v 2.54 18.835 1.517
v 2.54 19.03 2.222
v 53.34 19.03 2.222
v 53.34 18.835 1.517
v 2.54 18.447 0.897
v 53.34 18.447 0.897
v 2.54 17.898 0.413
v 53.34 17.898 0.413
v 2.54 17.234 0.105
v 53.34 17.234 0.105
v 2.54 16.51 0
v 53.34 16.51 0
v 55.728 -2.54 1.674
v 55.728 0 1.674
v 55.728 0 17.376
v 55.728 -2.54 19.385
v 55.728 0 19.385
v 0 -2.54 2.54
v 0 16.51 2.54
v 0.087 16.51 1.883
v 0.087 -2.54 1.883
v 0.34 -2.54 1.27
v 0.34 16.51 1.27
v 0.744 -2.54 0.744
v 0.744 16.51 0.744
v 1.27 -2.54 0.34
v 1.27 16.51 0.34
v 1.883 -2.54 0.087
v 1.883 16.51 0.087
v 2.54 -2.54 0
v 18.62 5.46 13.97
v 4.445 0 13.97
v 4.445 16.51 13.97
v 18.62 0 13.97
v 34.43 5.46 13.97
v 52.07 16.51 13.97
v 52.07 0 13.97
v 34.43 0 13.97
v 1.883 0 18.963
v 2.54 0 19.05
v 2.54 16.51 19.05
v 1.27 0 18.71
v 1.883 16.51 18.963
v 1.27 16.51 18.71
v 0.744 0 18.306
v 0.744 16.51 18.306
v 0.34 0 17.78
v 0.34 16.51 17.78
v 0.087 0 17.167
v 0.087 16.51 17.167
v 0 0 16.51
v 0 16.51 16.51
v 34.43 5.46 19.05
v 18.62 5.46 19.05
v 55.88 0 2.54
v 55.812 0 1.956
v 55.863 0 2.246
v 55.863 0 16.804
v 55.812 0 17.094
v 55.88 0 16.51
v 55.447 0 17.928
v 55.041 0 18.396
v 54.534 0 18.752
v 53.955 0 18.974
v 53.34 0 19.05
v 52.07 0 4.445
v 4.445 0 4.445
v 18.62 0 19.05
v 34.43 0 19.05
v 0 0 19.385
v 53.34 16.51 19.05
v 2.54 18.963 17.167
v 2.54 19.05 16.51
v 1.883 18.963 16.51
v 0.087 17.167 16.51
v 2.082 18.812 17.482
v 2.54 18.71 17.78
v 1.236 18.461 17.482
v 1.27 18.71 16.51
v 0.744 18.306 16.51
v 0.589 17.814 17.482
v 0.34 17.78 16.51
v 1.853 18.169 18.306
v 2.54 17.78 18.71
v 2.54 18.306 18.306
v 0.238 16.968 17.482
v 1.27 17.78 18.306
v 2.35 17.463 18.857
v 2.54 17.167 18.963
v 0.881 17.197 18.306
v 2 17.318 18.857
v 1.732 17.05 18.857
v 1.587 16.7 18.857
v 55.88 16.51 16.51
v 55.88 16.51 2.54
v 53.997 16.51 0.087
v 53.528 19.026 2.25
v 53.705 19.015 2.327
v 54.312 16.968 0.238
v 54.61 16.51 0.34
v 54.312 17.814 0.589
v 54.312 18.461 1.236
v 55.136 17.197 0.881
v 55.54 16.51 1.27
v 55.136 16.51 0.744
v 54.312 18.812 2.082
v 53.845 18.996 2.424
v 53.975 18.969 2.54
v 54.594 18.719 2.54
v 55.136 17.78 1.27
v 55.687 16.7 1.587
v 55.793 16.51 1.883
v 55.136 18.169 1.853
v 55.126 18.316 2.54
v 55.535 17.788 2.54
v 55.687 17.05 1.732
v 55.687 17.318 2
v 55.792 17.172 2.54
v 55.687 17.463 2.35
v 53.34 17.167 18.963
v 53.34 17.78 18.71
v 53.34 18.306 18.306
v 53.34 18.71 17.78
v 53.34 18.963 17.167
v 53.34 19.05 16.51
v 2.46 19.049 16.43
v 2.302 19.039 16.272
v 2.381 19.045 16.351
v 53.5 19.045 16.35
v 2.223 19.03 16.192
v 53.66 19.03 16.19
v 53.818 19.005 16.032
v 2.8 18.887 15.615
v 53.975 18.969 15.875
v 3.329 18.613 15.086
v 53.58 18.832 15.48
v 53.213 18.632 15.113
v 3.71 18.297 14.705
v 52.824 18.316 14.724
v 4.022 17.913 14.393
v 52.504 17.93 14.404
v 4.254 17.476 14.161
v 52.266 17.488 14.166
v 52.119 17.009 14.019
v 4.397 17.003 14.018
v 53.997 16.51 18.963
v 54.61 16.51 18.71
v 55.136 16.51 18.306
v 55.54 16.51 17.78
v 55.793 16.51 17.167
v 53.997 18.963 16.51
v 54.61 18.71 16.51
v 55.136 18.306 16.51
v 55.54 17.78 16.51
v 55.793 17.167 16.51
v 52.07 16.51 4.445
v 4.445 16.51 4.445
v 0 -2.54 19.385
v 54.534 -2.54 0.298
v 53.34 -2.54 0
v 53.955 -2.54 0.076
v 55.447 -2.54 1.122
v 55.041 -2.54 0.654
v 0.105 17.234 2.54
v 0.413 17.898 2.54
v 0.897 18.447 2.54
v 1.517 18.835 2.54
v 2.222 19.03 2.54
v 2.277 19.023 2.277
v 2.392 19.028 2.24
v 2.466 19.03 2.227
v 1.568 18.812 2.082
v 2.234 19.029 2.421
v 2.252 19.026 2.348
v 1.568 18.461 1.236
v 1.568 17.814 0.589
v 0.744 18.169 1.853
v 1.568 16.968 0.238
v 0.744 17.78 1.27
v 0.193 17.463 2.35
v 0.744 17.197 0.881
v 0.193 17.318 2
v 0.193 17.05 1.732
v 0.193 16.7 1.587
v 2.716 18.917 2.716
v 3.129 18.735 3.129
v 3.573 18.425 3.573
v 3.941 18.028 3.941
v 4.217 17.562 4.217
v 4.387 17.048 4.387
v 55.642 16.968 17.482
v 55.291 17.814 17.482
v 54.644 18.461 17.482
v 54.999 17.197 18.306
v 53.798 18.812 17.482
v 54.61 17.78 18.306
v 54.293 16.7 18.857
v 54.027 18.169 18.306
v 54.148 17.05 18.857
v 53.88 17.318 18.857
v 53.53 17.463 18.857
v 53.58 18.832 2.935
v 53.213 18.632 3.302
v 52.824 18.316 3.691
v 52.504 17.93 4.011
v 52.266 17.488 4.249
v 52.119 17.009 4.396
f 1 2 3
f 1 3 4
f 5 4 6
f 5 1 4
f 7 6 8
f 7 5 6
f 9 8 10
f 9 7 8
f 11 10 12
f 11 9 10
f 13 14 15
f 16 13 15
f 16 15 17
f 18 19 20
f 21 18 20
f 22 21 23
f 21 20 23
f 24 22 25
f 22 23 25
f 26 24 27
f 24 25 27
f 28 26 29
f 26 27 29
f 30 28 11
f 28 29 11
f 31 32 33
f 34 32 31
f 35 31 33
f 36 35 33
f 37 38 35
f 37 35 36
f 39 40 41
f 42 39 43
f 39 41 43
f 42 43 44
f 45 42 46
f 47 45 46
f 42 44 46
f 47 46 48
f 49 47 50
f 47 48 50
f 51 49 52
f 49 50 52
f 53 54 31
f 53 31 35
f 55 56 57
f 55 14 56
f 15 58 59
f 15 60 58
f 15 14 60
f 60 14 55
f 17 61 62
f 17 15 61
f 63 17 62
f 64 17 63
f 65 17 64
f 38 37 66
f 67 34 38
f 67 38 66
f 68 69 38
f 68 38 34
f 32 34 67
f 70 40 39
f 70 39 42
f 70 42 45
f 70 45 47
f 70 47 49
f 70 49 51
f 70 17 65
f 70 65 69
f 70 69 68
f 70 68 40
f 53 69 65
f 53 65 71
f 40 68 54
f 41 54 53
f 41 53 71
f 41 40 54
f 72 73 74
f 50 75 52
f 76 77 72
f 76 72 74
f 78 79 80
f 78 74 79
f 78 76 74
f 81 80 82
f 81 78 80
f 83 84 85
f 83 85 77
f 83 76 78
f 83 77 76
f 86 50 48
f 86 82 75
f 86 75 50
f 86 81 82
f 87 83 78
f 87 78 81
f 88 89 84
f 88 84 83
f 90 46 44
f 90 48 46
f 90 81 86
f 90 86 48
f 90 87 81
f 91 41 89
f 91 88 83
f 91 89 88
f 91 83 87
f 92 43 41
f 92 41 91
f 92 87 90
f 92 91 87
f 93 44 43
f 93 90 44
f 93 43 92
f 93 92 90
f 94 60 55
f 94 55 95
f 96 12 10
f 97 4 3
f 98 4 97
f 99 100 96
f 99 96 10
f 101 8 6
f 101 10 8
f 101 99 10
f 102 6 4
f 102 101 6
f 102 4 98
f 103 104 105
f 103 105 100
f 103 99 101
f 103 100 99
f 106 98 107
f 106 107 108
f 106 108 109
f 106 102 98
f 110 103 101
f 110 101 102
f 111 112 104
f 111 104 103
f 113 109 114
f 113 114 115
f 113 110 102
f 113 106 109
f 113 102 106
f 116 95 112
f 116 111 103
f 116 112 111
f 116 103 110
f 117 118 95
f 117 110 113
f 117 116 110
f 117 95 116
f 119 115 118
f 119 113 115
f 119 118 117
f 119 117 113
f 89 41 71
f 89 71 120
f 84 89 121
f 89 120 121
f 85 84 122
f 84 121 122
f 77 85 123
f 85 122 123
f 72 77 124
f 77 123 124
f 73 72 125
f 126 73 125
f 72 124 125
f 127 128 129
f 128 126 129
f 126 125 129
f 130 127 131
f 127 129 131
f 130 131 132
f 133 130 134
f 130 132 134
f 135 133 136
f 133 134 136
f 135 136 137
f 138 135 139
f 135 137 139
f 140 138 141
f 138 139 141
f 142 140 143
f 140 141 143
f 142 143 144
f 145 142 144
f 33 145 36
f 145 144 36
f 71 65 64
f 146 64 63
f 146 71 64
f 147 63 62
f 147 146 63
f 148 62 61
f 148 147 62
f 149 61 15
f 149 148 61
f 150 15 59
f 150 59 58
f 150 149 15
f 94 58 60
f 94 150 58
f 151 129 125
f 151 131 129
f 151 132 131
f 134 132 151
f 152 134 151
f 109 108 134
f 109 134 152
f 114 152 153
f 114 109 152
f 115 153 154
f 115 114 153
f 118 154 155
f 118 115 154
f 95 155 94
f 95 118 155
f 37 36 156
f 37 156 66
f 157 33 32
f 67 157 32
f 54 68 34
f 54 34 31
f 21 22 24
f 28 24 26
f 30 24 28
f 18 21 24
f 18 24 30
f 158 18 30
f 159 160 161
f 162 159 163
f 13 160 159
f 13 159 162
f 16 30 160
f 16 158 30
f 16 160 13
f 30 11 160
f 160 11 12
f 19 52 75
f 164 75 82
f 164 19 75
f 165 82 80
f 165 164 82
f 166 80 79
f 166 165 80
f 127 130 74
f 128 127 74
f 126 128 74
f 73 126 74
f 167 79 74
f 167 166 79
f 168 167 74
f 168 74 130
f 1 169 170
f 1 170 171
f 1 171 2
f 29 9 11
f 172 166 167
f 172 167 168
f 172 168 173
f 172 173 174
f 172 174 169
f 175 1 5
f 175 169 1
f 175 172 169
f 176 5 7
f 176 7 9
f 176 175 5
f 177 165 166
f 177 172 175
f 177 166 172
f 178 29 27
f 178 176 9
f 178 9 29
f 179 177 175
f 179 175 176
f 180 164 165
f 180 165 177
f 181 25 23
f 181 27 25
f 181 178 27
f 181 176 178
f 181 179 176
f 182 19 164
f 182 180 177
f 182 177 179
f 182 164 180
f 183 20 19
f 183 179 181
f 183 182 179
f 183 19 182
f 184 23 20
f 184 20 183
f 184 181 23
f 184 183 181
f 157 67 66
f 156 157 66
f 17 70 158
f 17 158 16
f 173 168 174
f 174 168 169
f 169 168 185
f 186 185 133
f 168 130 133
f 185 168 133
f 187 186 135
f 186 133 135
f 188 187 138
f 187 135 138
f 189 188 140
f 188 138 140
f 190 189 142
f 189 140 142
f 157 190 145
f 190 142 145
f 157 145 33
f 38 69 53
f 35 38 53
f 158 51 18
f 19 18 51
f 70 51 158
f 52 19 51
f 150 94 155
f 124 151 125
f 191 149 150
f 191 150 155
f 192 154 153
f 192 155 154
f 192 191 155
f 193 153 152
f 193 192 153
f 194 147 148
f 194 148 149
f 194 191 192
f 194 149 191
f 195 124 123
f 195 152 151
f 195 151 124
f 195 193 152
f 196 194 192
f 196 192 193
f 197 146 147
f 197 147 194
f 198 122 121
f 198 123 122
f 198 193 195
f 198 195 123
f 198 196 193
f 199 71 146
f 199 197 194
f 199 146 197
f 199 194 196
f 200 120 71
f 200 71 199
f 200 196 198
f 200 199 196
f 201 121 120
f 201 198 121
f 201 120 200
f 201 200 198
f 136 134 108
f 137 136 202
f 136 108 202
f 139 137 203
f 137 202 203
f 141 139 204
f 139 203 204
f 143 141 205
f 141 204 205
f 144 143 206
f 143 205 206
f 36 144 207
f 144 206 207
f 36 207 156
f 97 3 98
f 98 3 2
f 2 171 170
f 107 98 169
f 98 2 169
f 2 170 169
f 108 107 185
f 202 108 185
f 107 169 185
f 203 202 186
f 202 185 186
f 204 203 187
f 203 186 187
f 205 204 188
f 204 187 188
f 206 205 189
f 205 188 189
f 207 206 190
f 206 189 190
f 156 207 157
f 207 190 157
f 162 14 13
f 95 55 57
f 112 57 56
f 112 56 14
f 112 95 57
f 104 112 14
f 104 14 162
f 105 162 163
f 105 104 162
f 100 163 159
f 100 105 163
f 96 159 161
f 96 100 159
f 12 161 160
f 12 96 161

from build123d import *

# Parameters (mm, degrees)
F0_W         = 19.05
F0_H         = 19.05
F1_DEPTH     = 55.88
F2_W         = 47.625
F2_H         = 9.525
F3_DEPTH     = 25.4
F4_W         = 55.7279027998
F4_H         = 19.3847697228
F5_DEPTH     = 2.54
F6_T1_DEPTH  = 50.8
F6_T3_DEPTH  = 13.97
F6_T5_DEPTH  = 47.625
F6_T7_DEPTH  = 9.525
F6_T9_DEPTH  = 16.51
F6_T11_DEPTH = 25.4
F6_T13_DEPTH = 22.86
F6_S17_W     = 2.5908
F6_S17_H     = 2.5908
F6_T18_DEPTH = 2.5908
F6_S23_W     = 2.5908
F6_S23_H     = 2.5908
F6_T24_DEPTH = 2.5908
F6_S29_W     = 2.5908
F6_S29_H     = 2.5908
F6_T30_DEPTH = 2.5908
F6_S35_W     = 2.5908
F6_S35_H     = 2.5908
F6_T36_DEPTH = 2.5908
F6_T43_DEPTH = 53.975
F6_T48_DEPTH = 15.875
F6_T56_DEPTH = 53.975
F6_T61_DEPTH = 15.875
F6_T69_DEPTH = 15.875
F6_T74_DEPTH = 53.975
F6_T82_DEPTH = 53.975
F6_T87_DEPTH = 15.875
F7_W         = 15.8100910485
F7_H         = 5.4600955918
F8_DEPTH     = 12.7


# Not quite as in the source:
# - a fillet or chamfer that OpenCascade refuses, or shapes differently, is made with other operations: its cross-section is extruded or revolved along the edge and cut away or added


with BuildPart() as f1:
    # F0 (on Right) → F1 (new body)
    with BuildSketch(Plane.YZ):
        with Locations((9.525, 9.525)):
            Rectangle(F0_W, F0_H)
    extrude(amount=F1_DEPTH)

    # F2 (on face) → F3 (cut)
    with BuildSketch(Plane.XZ):
        with Locations((28.2575, 9.2075)):
            Rectangle(F2_W, F2_H)
    extrude(amount=-F3_DEPTH, mode=Mode.SUBTRACT)

    # F4 (on Front) → F5 (join)
    with BuildSketch(Plane.XZ):
        with Locations((27.8639513999, 9.6923848614)):
            Rectangle(F4_W, F4_H)
    extrude(amount=F5_DEPTH)

    # F6: fillet of radius 2.54 on 12 edges, made by hand

    # F6_s2 → F6_t1 (cut)
    with BuildSketch(Plane.YZ.offset(2.54)):
        with BuildLine():
            ThreePointArc((19.05, 2.54), (18.3060512242, 0.7439487758), (16.51, 0))
            Line((16.51, 0), (19.05, 0))
            Line((19.05, 0), (19.05, 2.54))
        make_face()
        with BuildLine():
            ThreePointArc((16.51, 19.05), (18.3060512242, 18.3060512242), (19.05, 16.51))
            Line((19.05, 16.51), (19.05, 19.05))
            Line((19.05, 19.05), (16.51, 19.05))
        make_face()
    extrude(amount=F6_T1_DEPTH, mode=Mode.SUBTRACT)

    # F6_s4 → F6_t3 (cut)
    with BuildSketch(Plane.XY.offset(2.54)):
        with BuildLine():
            ThreePointArc((0, 16.51), (0.7439487758, 18.3060512242), (2.54, 19.05))
            Line((2.54, 19.05), (0, 19.05))
            Line((0, 19.05), (0, 16.51))
        make_face()
        with BuildLine():
            ThreePointArc((53.34, 19.05), (55.1360512242, 18.3060512242), (55.88, 16.51))
            Line((55.88, 16.51), (55.88, 19.05))
            Line((55.88, 19.05), (53.34, 19.05))
        make_face()
    extrude(amount=F6_T3_DEPTH, mode=Mode.SUBTRACT)

    # F6_s6 → F6_t5 (cut)
    with BuildSketch(Plane.YZ.offset(4.445)):
        with BuildLine():
            ThreePointArc((19.05, 16.51), (18.3060512242, 14.7139487758), (16.51, 13.97))
            Line((16.51, 13.97), (19.05, 13.97))
            Line((19.05, 13.97), (19.05, 16.51))
        make_face()
        with BuildLine():
            ThreePointArc((19.05, 1.905), (18.3060512242, 3.7010512242), (16.51, 4.445))
            Line((16.51, 4.445), (19.05, 4.445))
            Line((19.05, 4.445), (19.05, 1.905))
        make_face()
    extrude(amount=F6_T5_DEPTH, mode=Mode.SUBTRACT)

    # F6_s8 → F6_t7 (cut)
    with BuildSketch(Plane.XY.offset(4.445)):
        with BuildLine():
            ThreePointArc((1.905, 19.05), (3.7010512242, 18.3060512242), (4.445, 16.51))
            Line((4.445, 16.51), (4.445, 19.05))
            Line((4.445, 19.05), (1.905, 19.05))
        make_face()
        with BuildLine():
            ThreePointArc((54.61, 19.05), (52.8139487758, 18.3060512242), (52.07, 16.51))
            Line((52.07, 16.51), (52.07, 19.05))
            Line((52.07, 19.05), (54.61, 19.05))
        make_face()
    extrude(amount=F6_T7_DEPTH, mode=Mode.SUBTRACT)

    # F6_s10 → F6_t9 (cut)
    with BuildSketch(Plane.XZ.offset(-16.51)):
        with BuildLine():
            ThreePointArc((2.54, 19.05), (0.7439487758, 18.3060512242), (0, 16.51))
            Line((0, 16.51), (0, 19.05))
            Line((0, 19.05), (2.54, 19.05))
        make_face()
        with BuildLine():
            ThreePointArc((53.34, 19.05), (55.1360512242, 18.3060512242), (55.88, 16.51))
            Line((55.88, 16.51), (55.88, 19.05))
            Line((55.88, 19.05), (53.34, 19.05))
        make_face()
    extrude(amount=F6_T9_DEPTH, mode=Mode.SUBTRACT)

    # F6_s12 → F6_t11 (cut)
    with BuildSketch(Plane.XZ.offset(-16.51)):
        with BuildLine():
            ThreePointArc((0, 2.54), (0.7439487758, 0.7439487758), (2.54, 0))
            Line((2.54, 0), (0, 0))
            Line((0, 0), (0, 2.54))
        make_face()
    extrude(amount=F6_T11_DEPTH, mode=Mode.SUBTRACT)

    # F6_s14 → F6_t13 (cut)
    with BuildSketch(Plane.XZ.offset(-16.51)):
        with BuildLine():
            ThreePointArc((55.88, 2.54), (55.1360512242, 0.7439487758), (53.34, 0))
            Line((53.34, 0), (55.88, 0))
            Line((55.88, 0), (55.88, 2.54))
        make_face()
    extrude(amount=F6_T13_DEPTH, mode=Mode.SUBTRACT)


with BuildPart() as f6_tool16:
    # F6_s17 → F6_t18 (new body)
    with BuildSketch(Plane.YZ.offset(2.54)):
        with Locations((17.8054, 1.2446)):
            Rectangle(F6_S17_W, F6_S17_H)
    extrude(amount=-F6_T18_DEPTH)

    # F6_s19 → F6_t20 (revolve, cut)
    with BuildSketch(Plane(origin=(2.54, 16.51, 2.54), x_dir=(0, -0.7071067812, 0.7071067812), z_dir=(0, -0.7071067812, -0.7071067812))):
        with BuildLine():
            ThreePointArc((0, -2.54), (2.54, 0), (0, 2.54))
            Line((0, 2.54), (0, -2.54))
        make_face()
    revolve(axis=Axis((2.54, 16.51, 2.54), (-1, 0, 0)), mode=Mode.SUBTRACT)


with BuildPart() as f1_1:
    add(f1.part)

    # F6_t15: cut F6_tool16
    add(f6_tool16.part, mode=Mode.SUBTRACT)


with BuildPart() as f6_tool22:
    # F6_s23 → F6_t24 (new body)
    with BuildSketch(Plane.YZ.offset(53.34)):
        with Locations((17.8054, 1.2446)):
            Rectangle(F6_S23_W, F6_S23_H)
    extrude(amount=F6_T24_DEPTH)

    # F6_s25 → F6_t26 (revolve, cut)
    with BuildSketch(Plane(origin=(53.34, 16.51, 2.54), x_dir=(0, -0.7071067812, 0.7071067812), z_dir=(0, 0.7071067812, 0.7071067812))):
        with BuildLine():
            ThreePointArc((0, -2.54), (2.54, 0), (0, 2.54))
            Line((0, 2.54), (0, -2.54))
        make_face()
    revolve(axis=Axis((53.34, 16.51, 2.54), (1, 0, 0)), mode=Mode.SUBTRACT)


with BuildPart() as f1_2:
    add(f1_1.part)

    # F6_t21: cut F6_tool22
    add(f6_tool22.part, mode=Mode.SUBTRACT)


with BuildPart() as f6_tool28:
    # F6_s29 → F6_t30 (new body)
    with BuildSketch(Plane.XY.offset(16.51)):
        with Locations((1.2446, 17.8054)):
            Rectangle(F6_S29_W, F6_S29_H)
    extrude(amount=F6_T30_DEPTH)

    # F6_s31 → F6_t32 (revolve, cut)
    with BuildSketch(Plane(origin=(2.54, 16.51, 16.51), x_dir=(0.7071067812, -0.7071067812, 0), z_dir=(-0.7071067812, -0.7071067812, 0))):
        with BuildLine():
            ThreePointArc((0, -2.54), (2.54, 0), (0, 2.54))
            Line((0, 2.54), (0, -2.54))
        make_face()
    revolve(axis=Axis((2.54, 16.51, 16.51), (0, 0, 1)), mode=Mode.SUBTRACT)


with BuildPart() as f1_3:
    add(f1_2.part)

    # F6_t27: cut F6_tool28
    add(f6_tool28.part, mode=Mode.SUBTRACT)


with BuildPart() as f6_tool34:
    # F6_s35 → F6_t36 (new body)
    with BuildSketch(Plane.XY.offset(16.51)):
        with Locations((54.6354, 17.8054)):
            Rectangle(F6_S35_W, F6_S35_H)
    extrude(amount=F6_T36_DEPTH)

    # F6_s37 → F6_t38 (revolve, cut)
    with BuildSketch(Plane(origin=(53.34, 16.51, 16.51), x_dir=(-0.7071067812, -0.7071067812, 0), z_dir=(-0.7071067812, 0.7071067812, 0))):
        with BuildLine():
            ThreePointArc((0, -2.54), (2.54, 0), (0, 2.54))
            Line((0, 2.54), (0, -2.54))
        make_face()
    revolve(axis=Axis((53.34, 16.51, 16.51), (0, 0, 1)), mode=Mode.SUBTRACT)


with BuildPart() as f1_4:
    add(f1_3.part)

    # F6_t33: cut F6_tool34
    add(f6_tool34.part, mode=Mode.SUBTRACT)


with BuildPart() as f6_tool41:
    # F6_s42 → F6_t43 (new body)
    with BuildSketch(Plane.YZ.offset(58.42)):
        with BuildLine():
            ThreePointArc((19.05, 16.51), (18.3060512242, 14.7139487758), (16.51, 13.97))
            Line((16.51, 13.97), (19.05, 13.97))
            Line((19.05, 13.97), (19.05, 16.51))
        make_face()
    extrude(amount=-F6_T43_DEPTH)

    split(bisect_by=Plane.YZ.offset(52.07), keep=Keep.TOP)

    split(bisect_by=Plane.YZ.offset(55.88), keep=Keep.BOTTOM)


with BuildPart() as f6_tool46:
    # F6_s47 → F6_t48 (new body)
    with BuildSketch(Plane.XY.offset(4.445)):
        with BuildLine():
            ThreePointArc((54.61, 19.05), (52.8139487758, 18.3060512242), (52.07, 16.51))
            Line((52.07, 16.51), (52.07, 19.05))
            Line((52.07, 19.05), (54.61, 19.05))
        make_face()
    extrude(amount=F6_T48_DEPTH)

    split(bisect_by=Plane.XY.offset(19.05), keep=Keep.BOTTOM)

    split(bisect_by=Plane.XY.offset(13.97), keep=Keep.TOP)


with BuildPart() as f6_tool41_1:
    add(f6_tool41.part)

    # F6_t51: intersect F6_tool46
    add(f6_tool46.part, mode=Mode.INTERSECT)


with BuildPart() as f1_5:
    add(f1_4.part)

    # F6_t39: cut F6_tool41
    add(f6_tool41_1.part, mode=Mode.SUBTRACT)


with BuildPart() as f6_tool54:
    # F6_s55 → F6_t56 (new body)
    with BuildSketch(Plane.YZ.offset(52.07)):
        with BuildLine():
            ThreePointArc((19.05, 16.51), (18.3060512242, 14.7139487758), (16.51, 13.97))
            Line((16.51, 13.97), (19.05, 13.97))
            Line((19.05, 13.97), (19.05, 16.51))
        make_face()
    extrude(amount=-F6_T56_DEPTH)

    split(bisect_by=Plane.YZ, keep=Keep.TOP)

    split(bisect_by=Plane.YZ.offset(4.445), keep=Keep.BOTTOM)


with BuildPart() as f6_tool59:
    # F6_s60 → F6_t61 (new body)
    with BuildSketch(Plane.XY.offset(20.32)):
        with BuildLine():
            ThreePointArc((1.905, 19.05), (3.7010512242, 18.3060512242), (4.445, 16.51))
            Line((4.445, 16.51), (4.445, 19.05))
            Line((4.445, 19.05), (1.905, 19.05))
        make_face()
    extrude(amount=-F6_T61_DEPTH)

    split(bisect_by=Plane.XY.offset(19.05), keep=Keep.BOTTOM)

    split(bisect_by=Plane.XY.offset(13.97), keep=Keep.TOP)


with BuildPart() as f6_tool54_1:
    add(f6_tool54.part)

    # F6_t64: intersect F6_tool59
    add(f6_tool59.part, mode=Mode.INTERSECT)


with BuildPart() as f1_6:
    add(f1_5.part)

    # F6_t52: cut F6_tool54
    add(f6_tool54_1.part, mode=Mode.SUBTRACT)


with BuildPart() as f6_tool67:
    # F6_s68 → F6_t69 (new body)
    with BuildSketch(Plane.XY.offset(13.97)):
        with BuildLine():
            ThreePointArc((1.905, 19.05), (3.7010512242, 18.3060512242), (4.445, 16.51))
            Line((4.445, 16.51), (4.445, 19.05))
            Line((4.445, 19.05), (1.905, 19.05))
        make_face()
    extrude(amount=-F6_T69_DEPTH)

    split(bisect_by=Plane.XY.offset(4.445), keep=Keep.BOTTOM)

    split(bisect_by=Plane.XY, keep=Keep.TOP)


with BuildPart() as f6_tool72:
    # F6_s73 → F6_t74 (new body)
    with BuildSketch(Plane.YZ.offset(-1.905)):
        with BuildLine():
            ThreePointArc((19.05, 1.905), (18.3060512242, 3.7010512242), (16.51, 4.445))
            Line((16.51, 4.445), (19.05, 4.445))
            Line((19.05, 4.445), (19.05, 1.905))
        make_face()
    extrude(amount=F6_T74_DEPTH)

    split(bisect_by=Plane.YZ, keep=Keep.TOP)

    split(bisect_by=Plane.YZ.offset(4.445), keep=Keep.BOTTOM)


with BuildPart() as f6_tool67_1:
    add(f6_tool67.part)

    # F6_t77: intersect F6_tool72
    add(f6_tool72.part, mode=Mode.INTERSECT)


with BuildPart() as f1_7:
    add(f1_6.part)

    # F6_t65: cut F6_tool67
    add(f6_tool67_1.part, mode=Mode.SUBTRACT)


with BuildPart() as f6_tool80:
    # F6_s81 → F6_t82 (new body)
    with BuildSketch(Plane.YZ.offset(4.445)):
        with BuildLine():
            ThreePointArc((19.05, 1.905), (18.3060512242, 3.7010512242), (16.51, 4.445))
            Line((16.51, 4.445), (19.05, 4.445))
            Line((19.05, 4.445), (19.05, 1.905))
        make_face()
    extrude(amount=F6_T82_DEPTH)

    split(bisect_by=Plane.YZ.offset(52.07), keep=Keep.TOP)

    split(bisect_by=Plane.YZ.offset(55.88), keep=Keep.BOTTOM)


with BuildPart() as f6_tool85:
    # F6_s86 → F6_t87 (new body)
    with BuildSketch(Plane.XY.offset(-1.905)):
        with BuildLine():
            ThreePointArc((54.61, 19.05), (52.8139487758, 18.3060512242), (52.07, 16.51))
            Line((52.07, 16.51), (52.07, 19.05))
            Line((52.07, 19.05), (54.61, 19.05))
        make_face()
    extrude(amount=F6_T87_DEPTH)

    split(bisect_by=Plane.XY.offset(4.445), keep=Keep.BOTTOM)

    split(bisect_by=Plane.XY, keep=Keep.TOP)


with BuildPart() as f6_tool80_1:
    add(f6_tool80.part)

    # F6_t90: intersect F6_tool85
    add(f6_tool85.part, mode=Mode.INTERSECT)


with BuildPart() as f1_8:
    add(f1_7.part)

    # F6_t78: cut F6_tool80
    add(f6_tool80_1.part, mode=Mode.SUBTRACT)

    # F7 (on face) → F8 (cut)
    with BuildSketch(Plane.XY.offset(19.05)):
        with Locations((26.5251491219, 2.7300477959)):
            Rectangle(F7_W, F7_H)
    extrude(amount=-F8_DEPTH, mode=Mode.SUBTRACT)


solid = f1_8.part
